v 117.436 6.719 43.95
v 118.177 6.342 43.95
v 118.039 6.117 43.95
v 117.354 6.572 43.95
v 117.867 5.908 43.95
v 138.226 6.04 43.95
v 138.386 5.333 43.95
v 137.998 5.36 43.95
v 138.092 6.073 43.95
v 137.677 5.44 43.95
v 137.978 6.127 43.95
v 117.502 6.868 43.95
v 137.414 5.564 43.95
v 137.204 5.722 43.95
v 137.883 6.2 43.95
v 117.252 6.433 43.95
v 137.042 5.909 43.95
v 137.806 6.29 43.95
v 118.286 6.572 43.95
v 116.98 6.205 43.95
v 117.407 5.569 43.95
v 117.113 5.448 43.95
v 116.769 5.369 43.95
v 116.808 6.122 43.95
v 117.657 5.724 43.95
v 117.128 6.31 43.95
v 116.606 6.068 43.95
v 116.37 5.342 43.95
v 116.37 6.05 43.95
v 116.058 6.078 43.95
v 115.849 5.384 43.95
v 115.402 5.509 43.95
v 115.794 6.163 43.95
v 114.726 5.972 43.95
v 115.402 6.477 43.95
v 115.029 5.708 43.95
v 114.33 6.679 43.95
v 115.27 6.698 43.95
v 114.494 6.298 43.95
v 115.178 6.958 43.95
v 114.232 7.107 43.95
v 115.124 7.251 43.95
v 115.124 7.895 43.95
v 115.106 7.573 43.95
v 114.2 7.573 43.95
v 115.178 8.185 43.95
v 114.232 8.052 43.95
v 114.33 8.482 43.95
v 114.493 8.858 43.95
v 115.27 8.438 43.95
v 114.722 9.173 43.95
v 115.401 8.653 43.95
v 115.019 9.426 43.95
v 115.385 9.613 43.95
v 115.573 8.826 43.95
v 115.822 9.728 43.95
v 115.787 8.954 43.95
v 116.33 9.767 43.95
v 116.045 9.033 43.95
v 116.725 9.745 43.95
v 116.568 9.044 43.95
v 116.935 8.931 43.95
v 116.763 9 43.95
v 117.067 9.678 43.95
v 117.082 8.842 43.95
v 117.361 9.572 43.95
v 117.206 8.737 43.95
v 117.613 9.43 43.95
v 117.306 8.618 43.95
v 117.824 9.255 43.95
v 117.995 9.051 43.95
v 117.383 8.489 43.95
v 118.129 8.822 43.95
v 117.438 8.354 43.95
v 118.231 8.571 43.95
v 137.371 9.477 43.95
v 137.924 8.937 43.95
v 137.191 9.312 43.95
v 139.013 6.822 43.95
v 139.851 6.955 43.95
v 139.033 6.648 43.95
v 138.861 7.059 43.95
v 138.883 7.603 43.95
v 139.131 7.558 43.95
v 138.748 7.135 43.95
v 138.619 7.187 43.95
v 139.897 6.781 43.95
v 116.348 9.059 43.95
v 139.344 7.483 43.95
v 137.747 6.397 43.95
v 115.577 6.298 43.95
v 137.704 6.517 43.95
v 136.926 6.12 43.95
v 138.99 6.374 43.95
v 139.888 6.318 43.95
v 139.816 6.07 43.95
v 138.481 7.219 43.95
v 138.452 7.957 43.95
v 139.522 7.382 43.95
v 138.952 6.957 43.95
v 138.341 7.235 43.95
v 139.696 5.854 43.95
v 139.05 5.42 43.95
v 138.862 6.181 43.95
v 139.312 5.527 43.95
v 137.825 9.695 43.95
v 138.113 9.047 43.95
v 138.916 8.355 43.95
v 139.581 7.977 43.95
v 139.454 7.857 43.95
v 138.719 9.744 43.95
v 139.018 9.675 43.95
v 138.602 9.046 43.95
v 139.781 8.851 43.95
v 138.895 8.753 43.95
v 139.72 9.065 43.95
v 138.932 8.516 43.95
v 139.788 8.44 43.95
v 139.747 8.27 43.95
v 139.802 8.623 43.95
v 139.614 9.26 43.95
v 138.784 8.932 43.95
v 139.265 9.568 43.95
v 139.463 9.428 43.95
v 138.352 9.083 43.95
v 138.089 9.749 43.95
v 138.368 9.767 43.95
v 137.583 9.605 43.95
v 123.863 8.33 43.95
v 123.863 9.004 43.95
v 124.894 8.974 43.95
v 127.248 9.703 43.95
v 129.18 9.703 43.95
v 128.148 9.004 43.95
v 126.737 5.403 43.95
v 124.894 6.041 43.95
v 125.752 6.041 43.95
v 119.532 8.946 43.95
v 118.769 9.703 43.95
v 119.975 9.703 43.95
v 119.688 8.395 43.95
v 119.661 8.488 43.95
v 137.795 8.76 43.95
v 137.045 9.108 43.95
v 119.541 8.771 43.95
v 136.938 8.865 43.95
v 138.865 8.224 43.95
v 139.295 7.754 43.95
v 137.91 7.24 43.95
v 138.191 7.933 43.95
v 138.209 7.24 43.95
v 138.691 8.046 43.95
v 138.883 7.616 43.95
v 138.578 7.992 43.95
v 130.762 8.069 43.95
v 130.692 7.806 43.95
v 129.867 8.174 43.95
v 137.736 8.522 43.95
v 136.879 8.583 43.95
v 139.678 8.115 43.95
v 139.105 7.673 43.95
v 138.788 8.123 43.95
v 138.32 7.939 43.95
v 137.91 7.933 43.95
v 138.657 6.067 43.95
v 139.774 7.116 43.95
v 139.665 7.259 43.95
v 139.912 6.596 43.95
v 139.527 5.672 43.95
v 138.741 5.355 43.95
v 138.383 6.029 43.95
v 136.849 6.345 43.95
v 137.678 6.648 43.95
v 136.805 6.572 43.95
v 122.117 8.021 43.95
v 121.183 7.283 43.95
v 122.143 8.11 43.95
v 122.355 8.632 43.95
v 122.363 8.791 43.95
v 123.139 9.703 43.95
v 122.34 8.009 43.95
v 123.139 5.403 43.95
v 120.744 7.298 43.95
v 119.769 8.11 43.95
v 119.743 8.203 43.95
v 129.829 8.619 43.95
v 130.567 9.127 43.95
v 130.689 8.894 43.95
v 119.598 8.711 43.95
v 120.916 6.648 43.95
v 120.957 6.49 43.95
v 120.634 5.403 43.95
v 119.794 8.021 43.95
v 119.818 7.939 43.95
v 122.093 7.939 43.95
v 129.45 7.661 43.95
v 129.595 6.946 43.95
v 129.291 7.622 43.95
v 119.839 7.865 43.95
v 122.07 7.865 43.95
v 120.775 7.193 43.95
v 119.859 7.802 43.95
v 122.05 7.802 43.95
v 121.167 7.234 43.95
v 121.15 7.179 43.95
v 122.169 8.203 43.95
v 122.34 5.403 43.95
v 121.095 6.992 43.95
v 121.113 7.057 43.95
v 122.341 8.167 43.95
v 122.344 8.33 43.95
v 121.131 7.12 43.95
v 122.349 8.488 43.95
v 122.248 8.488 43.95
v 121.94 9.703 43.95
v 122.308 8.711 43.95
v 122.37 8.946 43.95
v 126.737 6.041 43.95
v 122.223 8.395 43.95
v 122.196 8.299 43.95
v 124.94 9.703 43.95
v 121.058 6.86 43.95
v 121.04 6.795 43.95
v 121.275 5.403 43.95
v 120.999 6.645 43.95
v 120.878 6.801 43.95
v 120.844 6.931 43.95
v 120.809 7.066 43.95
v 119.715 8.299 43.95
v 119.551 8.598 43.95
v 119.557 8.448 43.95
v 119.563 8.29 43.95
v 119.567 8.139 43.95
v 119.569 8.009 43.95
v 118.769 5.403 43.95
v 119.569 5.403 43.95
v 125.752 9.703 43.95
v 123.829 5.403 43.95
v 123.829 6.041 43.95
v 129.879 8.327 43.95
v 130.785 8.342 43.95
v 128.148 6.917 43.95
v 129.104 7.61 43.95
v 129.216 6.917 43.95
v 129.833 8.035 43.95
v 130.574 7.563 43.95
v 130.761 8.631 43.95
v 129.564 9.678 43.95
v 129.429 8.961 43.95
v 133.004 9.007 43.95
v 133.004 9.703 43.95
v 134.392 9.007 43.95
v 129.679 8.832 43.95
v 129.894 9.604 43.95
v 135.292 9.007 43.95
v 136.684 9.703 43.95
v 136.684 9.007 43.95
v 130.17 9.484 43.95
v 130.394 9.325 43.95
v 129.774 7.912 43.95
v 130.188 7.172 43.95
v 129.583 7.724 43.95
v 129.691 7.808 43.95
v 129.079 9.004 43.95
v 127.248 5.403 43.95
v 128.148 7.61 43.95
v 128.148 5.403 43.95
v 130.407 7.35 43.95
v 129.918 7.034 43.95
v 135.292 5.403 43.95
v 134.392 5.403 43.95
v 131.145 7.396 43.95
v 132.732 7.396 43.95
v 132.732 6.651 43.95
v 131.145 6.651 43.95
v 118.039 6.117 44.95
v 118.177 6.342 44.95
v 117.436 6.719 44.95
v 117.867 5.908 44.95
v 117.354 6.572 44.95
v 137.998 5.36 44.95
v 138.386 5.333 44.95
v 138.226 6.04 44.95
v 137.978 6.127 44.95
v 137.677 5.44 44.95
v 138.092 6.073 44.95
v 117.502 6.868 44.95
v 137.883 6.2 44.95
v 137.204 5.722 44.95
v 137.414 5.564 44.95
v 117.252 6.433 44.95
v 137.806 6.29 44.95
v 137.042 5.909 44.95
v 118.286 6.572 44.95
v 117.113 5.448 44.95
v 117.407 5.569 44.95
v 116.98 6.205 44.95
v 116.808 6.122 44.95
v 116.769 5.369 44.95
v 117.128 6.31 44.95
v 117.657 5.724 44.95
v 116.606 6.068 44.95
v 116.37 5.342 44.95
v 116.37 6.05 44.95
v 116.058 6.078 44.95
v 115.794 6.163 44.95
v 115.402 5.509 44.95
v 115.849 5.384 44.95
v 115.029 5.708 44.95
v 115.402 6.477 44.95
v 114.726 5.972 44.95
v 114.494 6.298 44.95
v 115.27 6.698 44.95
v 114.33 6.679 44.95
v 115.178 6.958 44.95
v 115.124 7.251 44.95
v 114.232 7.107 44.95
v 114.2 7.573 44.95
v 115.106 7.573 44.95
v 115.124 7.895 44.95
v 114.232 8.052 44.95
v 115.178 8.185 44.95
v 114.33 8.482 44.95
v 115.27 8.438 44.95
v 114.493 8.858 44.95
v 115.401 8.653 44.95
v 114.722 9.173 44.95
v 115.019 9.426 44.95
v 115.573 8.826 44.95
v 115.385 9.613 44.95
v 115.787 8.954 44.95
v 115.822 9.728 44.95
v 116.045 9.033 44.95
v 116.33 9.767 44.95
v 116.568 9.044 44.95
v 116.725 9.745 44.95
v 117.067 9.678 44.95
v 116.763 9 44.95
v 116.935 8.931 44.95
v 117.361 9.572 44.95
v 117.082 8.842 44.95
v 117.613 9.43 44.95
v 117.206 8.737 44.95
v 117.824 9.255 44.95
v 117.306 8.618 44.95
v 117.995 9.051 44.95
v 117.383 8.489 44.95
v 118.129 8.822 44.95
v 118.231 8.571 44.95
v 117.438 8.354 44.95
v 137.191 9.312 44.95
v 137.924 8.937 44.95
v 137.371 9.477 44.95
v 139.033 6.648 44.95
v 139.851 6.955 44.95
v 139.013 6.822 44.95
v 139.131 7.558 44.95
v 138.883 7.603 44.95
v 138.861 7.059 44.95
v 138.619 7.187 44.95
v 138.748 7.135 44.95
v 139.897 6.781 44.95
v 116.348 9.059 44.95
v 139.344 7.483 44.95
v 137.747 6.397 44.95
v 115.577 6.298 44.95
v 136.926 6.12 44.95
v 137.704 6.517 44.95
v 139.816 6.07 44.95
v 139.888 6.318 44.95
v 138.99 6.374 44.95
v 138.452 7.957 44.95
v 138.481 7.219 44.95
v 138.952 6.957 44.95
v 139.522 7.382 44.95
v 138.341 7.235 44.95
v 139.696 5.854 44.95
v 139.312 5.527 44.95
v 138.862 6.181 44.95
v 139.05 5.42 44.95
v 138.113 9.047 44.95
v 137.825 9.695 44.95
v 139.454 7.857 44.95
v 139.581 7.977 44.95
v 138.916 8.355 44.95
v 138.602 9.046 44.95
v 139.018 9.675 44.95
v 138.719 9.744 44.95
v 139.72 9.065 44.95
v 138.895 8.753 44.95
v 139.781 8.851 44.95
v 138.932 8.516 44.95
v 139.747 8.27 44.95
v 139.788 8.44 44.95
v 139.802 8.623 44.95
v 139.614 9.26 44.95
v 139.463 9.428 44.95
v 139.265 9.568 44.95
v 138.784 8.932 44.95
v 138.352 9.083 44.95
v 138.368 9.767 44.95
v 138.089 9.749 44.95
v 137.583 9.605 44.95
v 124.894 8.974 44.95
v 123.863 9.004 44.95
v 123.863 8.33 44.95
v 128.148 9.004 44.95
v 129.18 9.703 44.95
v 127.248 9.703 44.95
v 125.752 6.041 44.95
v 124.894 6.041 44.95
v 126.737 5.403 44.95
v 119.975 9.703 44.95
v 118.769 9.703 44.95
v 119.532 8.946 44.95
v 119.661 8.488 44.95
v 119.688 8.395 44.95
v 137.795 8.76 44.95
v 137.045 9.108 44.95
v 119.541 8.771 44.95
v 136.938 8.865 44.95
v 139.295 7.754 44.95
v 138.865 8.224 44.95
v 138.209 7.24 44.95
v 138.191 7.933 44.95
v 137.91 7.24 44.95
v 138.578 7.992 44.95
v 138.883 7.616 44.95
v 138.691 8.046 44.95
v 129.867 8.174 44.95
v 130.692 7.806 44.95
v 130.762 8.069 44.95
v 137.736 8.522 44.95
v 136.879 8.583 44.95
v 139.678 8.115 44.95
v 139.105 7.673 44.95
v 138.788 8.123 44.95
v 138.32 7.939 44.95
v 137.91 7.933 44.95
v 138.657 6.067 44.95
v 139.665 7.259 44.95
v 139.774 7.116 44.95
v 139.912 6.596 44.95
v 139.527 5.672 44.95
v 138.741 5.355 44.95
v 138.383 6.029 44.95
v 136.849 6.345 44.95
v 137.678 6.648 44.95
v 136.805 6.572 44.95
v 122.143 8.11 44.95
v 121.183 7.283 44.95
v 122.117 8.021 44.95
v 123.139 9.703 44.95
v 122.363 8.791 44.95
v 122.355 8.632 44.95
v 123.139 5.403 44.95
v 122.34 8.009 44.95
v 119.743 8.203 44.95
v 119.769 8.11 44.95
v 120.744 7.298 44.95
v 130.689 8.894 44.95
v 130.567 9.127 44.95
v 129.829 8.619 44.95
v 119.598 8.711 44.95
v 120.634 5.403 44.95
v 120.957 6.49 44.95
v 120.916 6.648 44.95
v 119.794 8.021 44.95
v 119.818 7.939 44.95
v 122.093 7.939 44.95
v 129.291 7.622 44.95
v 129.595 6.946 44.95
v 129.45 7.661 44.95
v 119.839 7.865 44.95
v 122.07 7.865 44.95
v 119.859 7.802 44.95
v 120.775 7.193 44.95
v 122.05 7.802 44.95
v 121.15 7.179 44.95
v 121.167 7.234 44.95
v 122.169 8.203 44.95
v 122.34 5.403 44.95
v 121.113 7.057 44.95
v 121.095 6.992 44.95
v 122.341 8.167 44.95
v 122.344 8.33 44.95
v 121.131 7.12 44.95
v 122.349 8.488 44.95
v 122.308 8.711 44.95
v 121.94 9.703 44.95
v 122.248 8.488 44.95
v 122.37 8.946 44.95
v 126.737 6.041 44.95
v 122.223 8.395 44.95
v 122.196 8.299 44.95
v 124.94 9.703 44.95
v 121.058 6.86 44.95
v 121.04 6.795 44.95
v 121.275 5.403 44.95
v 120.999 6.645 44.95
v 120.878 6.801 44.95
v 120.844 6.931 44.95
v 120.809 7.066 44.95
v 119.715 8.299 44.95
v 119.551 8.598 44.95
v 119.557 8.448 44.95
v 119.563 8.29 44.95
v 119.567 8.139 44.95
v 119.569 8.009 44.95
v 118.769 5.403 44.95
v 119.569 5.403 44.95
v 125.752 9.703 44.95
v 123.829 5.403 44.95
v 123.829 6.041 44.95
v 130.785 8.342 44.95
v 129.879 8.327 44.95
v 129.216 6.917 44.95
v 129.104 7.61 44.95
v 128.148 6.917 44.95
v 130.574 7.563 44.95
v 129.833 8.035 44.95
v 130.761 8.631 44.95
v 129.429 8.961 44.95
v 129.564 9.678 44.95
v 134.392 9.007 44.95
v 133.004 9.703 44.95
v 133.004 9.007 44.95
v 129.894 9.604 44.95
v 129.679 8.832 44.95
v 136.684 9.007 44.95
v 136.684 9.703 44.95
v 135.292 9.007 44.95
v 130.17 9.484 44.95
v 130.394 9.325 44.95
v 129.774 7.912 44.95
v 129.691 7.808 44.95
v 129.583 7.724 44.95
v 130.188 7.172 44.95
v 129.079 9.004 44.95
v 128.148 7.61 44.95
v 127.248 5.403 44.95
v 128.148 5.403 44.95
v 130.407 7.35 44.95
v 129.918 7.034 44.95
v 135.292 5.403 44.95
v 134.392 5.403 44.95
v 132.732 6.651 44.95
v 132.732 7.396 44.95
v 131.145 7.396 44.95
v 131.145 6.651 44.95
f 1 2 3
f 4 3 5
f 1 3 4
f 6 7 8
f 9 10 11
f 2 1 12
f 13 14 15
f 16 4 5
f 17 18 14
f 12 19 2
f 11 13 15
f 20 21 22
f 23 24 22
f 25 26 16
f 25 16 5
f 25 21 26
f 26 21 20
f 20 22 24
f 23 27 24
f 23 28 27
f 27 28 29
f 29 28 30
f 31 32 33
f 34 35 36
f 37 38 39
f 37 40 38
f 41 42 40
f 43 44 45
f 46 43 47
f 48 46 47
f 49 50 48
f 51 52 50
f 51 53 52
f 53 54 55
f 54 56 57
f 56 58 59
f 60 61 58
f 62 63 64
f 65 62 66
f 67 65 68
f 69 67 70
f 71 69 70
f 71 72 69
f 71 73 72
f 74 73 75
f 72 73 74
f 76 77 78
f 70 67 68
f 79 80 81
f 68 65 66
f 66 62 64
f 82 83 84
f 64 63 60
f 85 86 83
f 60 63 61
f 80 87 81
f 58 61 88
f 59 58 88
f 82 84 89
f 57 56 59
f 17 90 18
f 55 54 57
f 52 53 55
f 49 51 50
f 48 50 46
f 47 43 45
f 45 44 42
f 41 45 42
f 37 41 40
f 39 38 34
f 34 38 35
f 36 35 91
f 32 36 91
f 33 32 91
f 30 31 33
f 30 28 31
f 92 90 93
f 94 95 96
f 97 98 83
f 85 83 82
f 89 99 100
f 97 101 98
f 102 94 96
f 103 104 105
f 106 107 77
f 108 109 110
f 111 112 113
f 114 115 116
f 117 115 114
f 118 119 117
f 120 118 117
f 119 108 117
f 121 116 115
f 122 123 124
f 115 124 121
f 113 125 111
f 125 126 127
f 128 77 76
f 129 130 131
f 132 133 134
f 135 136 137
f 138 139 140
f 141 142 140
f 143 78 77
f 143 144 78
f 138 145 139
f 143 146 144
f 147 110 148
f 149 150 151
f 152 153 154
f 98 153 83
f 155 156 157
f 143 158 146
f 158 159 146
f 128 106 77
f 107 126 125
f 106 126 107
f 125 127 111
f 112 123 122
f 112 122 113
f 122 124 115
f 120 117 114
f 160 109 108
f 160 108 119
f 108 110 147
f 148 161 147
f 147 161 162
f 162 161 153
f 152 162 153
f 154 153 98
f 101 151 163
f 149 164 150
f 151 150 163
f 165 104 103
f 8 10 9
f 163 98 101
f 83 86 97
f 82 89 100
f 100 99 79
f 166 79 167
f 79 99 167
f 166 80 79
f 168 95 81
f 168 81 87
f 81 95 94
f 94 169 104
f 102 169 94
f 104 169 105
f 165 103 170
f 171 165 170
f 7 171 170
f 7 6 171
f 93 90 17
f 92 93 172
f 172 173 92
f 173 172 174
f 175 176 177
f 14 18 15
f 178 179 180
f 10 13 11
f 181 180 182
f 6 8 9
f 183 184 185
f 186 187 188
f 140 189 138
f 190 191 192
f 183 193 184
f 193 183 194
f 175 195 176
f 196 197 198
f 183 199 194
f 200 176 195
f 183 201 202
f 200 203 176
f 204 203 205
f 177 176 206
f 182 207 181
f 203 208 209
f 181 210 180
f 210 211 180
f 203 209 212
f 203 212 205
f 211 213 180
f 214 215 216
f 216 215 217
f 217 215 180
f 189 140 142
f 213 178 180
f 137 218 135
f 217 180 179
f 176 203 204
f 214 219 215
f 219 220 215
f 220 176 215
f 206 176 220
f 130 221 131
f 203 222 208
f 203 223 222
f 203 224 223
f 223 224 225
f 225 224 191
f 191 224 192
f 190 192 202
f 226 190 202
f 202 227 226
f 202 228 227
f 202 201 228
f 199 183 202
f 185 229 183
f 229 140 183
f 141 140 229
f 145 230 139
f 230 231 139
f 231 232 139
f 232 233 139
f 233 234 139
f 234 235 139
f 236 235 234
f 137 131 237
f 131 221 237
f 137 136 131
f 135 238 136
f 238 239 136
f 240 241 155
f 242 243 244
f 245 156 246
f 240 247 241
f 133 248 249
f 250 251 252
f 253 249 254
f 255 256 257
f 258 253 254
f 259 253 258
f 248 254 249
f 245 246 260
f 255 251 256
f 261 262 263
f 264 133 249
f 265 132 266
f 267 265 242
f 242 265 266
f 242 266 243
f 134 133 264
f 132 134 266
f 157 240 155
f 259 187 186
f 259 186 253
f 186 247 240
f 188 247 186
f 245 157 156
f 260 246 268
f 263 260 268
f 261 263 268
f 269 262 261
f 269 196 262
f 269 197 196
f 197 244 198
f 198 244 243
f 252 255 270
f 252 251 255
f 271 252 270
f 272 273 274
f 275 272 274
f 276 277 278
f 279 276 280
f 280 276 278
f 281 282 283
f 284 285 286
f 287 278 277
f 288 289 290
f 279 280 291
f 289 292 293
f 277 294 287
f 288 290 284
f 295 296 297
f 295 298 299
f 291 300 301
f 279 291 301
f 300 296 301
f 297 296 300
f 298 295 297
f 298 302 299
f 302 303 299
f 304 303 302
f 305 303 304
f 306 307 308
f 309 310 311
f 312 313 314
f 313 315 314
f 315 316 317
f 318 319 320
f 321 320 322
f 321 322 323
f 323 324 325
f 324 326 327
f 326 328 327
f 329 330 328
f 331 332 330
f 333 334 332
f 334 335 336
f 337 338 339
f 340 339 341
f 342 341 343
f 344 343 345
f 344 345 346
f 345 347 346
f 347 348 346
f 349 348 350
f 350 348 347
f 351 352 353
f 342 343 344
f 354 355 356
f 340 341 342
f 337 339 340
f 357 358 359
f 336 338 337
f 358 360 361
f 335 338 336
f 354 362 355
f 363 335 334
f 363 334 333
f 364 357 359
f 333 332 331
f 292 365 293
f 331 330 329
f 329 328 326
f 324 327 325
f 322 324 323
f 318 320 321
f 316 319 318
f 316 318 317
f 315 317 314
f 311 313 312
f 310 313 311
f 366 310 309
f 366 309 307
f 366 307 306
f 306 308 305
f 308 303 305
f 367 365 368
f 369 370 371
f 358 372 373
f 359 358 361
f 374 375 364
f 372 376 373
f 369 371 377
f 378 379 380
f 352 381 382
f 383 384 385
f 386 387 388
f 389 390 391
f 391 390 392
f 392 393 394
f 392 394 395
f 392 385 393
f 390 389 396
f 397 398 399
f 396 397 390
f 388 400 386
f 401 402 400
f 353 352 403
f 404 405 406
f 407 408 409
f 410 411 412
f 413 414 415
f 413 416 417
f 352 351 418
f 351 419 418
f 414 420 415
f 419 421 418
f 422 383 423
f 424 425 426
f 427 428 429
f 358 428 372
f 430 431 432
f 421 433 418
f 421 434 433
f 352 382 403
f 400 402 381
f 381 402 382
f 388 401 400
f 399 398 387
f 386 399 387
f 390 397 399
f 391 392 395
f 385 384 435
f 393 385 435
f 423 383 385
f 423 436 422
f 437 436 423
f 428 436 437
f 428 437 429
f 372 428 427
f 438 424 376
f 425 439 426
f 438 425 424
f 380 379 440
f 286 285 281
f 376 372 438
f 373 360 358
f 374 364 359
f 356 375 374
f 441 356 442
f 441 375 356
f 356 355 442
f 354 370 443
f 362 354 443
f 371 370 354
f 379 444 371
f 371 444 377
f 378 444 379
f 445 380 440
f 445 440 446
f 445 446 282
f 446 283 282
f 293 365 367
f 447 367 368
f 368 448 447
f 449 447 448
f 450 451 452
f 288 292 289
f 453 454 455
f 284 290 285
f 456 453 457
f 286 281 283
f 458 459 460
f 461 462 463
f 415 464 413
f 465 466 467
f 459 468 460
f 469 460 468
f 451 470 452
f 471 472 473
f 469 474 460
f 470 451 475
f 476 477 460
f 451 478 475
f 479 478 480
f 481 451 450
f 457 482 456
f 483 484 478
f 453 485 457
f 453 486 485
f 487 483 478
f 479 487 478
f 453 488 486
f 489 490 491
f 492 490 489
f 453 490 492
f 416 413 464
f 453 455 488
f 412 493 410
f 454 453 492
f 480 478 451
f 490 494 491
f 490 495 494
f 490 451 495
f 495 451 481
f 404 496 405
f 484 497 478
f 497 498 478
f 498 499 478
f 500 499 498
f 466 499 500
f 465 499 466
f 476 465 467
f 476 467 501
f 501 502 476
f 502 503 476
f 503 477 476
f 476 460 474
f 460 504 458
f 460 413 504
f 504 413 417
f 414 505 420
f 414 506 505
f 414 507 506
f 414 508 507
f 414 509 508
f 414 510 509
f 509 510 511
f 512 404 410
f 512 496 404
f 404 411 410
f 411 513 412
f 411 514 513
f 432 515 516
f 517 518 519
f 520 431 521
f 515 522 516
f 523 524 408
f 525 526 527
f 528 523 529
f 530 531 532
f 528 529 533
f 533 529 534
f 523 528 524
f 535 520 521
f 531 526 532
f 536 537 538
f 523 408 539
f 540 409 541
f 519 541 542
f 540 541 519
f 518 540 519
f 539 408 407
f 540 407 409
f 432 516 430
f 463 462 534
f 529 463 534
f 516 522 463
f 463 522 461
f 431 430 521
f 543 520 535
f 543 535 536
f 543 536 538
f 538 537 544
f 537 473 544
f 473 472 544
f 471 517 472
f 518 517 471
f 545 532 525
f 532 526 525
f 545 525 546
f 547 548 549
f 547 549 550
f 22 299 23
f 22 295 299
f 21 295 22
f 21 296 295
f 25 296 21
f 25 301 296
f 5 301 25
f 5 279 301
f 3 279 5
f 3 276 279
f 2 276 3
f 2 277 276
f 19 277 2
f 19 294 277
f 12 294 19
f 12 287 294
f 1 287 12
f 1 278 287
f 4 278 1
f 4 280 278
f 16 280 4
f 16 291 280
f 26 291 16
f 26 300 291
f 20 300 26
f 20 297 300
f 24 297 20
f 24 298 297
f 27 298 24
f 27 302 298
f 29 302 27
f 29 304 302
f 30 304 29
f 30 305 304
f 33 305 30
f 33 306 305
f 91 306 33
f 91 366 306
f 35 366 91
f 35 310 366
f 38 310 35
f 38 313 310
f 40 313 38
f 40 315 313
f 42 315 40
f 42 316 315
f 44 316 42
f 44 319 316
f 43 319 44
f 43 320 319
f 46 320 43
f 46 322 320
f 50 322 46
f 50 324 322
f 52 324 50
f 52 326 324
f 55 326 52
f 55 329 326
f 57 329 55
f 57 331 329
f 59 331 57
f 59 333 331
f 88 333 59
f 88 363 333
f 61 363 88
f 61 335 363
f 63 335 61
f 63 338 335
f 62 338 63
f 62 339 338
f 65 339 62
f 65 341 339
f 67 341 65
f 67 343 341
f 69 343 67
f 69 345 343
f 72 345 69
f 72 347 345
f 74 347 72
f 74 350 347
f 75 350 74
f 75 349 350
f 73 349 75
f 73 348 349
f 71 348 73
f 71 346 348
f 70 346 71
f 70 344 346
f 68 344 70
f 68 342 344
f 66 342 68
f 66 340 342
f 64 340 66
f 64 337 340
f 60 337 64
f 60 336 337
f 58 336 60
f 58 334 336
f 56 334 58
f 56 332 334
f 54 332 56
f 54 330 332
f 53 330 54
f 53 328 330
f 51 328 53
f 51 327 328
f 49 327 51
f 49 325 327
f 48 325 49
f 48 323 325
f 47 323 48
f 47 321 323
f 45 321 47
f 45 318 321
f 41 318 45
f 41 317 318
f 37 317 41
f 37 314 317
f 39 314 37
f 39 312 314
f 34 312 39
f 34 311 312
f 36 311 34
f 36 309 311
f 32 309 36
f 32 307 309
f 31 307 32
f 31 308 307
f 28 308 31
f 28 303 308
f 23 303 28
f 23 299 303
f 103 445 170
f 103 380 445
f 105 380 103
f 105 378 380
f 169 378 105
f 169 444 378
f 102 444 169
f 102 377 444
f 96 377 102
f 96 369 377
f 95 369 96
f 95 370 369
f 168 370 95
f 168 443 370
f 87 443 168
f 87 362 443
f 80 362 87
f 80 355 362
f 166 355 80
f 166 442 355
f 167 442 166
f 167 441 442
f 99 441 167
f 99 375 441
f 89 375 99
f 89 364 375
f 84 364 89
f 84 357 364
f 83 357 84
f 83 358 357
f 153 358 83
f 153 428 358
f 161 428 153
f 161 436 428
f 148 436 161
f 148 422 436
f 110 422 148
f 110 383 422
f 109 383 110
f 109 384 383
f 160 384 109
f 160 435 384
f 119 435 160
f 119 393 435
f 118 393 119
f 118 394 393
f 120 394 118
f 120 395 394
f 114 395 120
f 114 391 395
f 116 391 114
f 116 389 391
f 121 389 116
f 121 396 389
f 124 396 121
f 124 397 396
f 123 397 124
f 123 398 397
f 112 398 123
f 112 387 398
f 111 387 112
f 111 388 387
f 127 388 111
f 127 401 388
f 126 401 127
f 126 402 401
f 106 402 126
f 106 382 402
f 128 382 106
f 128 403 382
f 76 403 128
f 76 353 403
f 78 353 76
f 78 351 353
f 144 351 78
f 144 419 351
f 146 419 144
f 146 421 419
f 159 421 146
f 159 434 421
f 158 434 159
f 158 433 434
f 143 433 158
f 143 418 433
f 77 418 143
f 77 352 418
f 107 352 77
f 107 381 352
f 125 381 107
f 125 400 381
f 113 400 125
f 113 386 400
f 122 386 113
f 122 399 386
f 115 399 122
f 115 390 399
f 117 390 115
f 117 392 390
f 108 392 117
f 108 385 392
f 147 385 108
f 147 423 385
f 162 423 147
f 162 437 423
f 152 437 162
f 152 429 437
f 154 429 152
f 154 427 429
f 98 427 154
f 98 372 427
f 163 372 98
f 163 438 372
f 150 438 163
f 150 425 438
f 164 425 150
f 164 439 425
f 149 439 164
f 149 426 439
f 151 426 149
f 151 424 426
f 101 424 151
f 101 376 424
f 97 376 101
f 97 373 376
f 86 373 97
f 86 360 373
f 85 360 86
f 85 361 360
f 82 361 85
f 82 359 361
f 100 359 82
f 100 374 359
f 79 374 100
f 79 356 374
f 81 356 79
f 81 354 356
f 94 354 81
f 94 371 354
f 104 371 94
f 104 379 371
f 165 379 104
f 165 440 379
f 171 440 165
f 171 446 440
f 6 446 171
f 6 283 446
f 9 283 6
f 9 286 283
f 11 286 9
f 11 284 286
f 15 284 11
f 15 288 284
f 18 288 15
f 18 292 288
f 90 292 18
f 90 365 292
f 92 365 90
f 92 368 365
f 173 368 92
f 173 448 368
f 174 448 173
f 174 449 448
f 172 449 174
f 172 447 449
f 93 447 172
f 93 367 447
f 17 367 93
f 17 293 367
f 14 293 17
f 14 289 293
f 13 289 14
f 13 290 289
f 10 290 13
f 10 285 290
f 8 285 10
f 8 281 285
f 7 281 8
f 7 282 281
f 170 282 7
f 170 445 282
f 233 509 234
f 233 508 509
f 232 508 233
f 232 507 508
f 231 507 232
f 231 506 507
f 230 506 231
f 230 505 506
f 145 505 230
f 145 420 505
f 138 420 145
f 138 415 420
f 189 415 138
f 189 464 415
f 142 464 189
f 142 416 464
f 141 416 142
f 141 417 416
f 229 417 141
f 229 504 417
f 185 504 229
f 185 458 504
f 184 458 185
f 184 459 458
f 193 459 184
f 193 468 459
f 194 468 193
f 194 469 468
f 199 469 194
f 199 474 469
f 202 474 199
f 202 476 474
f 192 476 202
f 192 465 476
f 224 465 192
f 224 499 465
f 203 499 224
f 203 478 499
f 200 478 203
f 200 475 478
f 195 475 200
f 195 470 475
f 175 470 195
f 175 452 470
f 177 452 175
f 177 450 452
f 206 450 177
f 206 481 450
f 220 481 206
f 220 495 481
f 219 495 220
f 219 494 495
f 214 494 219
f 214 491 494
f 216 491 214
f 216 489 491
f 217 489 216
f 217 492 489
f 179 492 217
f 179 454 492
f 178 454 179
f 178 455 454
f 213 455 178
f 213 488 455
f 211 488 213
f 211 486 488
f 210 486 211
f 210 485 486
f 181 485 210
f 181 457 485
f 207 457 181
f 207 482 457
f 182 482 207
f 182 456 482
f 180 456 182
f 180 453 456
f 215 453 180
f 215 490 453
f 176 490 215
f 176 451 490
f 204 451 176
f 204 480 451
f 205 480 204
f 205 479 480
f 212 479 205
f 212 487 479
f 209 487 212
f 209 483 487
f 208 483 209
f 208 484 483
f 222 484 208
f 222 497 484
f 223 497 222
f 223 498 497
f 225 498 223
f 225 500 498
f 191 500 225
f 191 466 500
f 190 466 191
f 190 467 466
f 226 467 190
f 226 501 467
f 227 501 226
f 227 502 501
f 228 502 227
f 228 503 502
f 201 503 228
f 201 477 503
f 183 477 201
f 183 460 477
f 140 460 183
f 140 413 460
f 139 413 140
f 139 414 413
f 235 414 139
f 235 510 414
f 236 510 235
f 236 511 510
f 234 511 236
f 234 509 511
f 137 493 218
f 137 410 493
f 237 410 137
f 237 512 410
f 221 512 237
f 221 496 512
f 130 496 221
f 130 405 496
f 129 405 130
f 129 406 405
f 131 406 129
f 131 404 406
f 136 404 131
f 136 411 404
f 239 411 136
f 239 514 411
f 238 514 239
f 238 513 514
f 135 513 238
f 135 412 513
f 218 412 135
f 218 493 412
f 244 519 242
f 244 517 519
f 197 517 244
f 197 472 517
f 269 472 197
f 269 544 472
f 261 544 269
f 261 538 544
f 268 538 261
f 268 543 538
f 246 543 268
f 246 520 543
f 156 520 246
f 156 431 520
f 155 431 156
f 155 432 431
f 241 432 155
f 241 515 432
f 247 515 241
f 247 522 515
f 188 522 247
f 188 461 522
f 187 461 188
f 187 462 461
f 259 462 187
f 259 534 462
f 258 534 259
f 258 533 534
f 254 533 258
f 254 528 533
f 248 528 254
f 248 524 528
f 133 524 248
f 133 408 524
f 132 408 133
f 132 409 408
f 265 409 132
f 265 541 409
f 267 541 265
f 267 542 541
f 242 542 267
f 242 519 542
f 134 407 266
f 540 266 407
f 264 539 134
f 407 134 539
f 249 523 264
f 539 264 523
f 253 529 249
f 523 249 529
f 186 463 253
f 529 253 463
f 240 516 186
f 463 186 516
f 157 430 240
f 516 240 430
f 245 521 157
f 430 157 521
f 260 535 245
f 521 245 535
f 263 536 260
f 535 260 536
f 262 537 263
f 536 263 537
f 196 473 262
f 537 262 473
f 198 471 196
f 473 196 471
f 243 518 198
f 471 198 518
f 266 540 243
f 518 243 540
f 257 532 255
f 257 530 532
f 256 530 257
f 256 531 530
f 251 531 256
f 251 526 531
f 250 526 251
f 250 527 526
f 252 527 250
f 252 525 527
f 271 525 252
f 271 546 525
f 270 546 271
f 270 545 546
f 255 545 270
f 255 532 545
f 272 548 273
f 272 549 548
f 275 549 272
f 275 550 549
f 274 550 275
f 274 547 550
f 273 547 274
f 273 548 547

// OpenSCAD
// CM1P-T3 ID text, engraved 0.5 into the plate's top face (frame as cm1p_t3_freecad.py).
translate([127, 7.5, 43.95]) linear_extrude(1) text("CM1P-T3", size = 4.5, font = "Liberation Sans:style=Bold", halign = "center", valign = "center");
